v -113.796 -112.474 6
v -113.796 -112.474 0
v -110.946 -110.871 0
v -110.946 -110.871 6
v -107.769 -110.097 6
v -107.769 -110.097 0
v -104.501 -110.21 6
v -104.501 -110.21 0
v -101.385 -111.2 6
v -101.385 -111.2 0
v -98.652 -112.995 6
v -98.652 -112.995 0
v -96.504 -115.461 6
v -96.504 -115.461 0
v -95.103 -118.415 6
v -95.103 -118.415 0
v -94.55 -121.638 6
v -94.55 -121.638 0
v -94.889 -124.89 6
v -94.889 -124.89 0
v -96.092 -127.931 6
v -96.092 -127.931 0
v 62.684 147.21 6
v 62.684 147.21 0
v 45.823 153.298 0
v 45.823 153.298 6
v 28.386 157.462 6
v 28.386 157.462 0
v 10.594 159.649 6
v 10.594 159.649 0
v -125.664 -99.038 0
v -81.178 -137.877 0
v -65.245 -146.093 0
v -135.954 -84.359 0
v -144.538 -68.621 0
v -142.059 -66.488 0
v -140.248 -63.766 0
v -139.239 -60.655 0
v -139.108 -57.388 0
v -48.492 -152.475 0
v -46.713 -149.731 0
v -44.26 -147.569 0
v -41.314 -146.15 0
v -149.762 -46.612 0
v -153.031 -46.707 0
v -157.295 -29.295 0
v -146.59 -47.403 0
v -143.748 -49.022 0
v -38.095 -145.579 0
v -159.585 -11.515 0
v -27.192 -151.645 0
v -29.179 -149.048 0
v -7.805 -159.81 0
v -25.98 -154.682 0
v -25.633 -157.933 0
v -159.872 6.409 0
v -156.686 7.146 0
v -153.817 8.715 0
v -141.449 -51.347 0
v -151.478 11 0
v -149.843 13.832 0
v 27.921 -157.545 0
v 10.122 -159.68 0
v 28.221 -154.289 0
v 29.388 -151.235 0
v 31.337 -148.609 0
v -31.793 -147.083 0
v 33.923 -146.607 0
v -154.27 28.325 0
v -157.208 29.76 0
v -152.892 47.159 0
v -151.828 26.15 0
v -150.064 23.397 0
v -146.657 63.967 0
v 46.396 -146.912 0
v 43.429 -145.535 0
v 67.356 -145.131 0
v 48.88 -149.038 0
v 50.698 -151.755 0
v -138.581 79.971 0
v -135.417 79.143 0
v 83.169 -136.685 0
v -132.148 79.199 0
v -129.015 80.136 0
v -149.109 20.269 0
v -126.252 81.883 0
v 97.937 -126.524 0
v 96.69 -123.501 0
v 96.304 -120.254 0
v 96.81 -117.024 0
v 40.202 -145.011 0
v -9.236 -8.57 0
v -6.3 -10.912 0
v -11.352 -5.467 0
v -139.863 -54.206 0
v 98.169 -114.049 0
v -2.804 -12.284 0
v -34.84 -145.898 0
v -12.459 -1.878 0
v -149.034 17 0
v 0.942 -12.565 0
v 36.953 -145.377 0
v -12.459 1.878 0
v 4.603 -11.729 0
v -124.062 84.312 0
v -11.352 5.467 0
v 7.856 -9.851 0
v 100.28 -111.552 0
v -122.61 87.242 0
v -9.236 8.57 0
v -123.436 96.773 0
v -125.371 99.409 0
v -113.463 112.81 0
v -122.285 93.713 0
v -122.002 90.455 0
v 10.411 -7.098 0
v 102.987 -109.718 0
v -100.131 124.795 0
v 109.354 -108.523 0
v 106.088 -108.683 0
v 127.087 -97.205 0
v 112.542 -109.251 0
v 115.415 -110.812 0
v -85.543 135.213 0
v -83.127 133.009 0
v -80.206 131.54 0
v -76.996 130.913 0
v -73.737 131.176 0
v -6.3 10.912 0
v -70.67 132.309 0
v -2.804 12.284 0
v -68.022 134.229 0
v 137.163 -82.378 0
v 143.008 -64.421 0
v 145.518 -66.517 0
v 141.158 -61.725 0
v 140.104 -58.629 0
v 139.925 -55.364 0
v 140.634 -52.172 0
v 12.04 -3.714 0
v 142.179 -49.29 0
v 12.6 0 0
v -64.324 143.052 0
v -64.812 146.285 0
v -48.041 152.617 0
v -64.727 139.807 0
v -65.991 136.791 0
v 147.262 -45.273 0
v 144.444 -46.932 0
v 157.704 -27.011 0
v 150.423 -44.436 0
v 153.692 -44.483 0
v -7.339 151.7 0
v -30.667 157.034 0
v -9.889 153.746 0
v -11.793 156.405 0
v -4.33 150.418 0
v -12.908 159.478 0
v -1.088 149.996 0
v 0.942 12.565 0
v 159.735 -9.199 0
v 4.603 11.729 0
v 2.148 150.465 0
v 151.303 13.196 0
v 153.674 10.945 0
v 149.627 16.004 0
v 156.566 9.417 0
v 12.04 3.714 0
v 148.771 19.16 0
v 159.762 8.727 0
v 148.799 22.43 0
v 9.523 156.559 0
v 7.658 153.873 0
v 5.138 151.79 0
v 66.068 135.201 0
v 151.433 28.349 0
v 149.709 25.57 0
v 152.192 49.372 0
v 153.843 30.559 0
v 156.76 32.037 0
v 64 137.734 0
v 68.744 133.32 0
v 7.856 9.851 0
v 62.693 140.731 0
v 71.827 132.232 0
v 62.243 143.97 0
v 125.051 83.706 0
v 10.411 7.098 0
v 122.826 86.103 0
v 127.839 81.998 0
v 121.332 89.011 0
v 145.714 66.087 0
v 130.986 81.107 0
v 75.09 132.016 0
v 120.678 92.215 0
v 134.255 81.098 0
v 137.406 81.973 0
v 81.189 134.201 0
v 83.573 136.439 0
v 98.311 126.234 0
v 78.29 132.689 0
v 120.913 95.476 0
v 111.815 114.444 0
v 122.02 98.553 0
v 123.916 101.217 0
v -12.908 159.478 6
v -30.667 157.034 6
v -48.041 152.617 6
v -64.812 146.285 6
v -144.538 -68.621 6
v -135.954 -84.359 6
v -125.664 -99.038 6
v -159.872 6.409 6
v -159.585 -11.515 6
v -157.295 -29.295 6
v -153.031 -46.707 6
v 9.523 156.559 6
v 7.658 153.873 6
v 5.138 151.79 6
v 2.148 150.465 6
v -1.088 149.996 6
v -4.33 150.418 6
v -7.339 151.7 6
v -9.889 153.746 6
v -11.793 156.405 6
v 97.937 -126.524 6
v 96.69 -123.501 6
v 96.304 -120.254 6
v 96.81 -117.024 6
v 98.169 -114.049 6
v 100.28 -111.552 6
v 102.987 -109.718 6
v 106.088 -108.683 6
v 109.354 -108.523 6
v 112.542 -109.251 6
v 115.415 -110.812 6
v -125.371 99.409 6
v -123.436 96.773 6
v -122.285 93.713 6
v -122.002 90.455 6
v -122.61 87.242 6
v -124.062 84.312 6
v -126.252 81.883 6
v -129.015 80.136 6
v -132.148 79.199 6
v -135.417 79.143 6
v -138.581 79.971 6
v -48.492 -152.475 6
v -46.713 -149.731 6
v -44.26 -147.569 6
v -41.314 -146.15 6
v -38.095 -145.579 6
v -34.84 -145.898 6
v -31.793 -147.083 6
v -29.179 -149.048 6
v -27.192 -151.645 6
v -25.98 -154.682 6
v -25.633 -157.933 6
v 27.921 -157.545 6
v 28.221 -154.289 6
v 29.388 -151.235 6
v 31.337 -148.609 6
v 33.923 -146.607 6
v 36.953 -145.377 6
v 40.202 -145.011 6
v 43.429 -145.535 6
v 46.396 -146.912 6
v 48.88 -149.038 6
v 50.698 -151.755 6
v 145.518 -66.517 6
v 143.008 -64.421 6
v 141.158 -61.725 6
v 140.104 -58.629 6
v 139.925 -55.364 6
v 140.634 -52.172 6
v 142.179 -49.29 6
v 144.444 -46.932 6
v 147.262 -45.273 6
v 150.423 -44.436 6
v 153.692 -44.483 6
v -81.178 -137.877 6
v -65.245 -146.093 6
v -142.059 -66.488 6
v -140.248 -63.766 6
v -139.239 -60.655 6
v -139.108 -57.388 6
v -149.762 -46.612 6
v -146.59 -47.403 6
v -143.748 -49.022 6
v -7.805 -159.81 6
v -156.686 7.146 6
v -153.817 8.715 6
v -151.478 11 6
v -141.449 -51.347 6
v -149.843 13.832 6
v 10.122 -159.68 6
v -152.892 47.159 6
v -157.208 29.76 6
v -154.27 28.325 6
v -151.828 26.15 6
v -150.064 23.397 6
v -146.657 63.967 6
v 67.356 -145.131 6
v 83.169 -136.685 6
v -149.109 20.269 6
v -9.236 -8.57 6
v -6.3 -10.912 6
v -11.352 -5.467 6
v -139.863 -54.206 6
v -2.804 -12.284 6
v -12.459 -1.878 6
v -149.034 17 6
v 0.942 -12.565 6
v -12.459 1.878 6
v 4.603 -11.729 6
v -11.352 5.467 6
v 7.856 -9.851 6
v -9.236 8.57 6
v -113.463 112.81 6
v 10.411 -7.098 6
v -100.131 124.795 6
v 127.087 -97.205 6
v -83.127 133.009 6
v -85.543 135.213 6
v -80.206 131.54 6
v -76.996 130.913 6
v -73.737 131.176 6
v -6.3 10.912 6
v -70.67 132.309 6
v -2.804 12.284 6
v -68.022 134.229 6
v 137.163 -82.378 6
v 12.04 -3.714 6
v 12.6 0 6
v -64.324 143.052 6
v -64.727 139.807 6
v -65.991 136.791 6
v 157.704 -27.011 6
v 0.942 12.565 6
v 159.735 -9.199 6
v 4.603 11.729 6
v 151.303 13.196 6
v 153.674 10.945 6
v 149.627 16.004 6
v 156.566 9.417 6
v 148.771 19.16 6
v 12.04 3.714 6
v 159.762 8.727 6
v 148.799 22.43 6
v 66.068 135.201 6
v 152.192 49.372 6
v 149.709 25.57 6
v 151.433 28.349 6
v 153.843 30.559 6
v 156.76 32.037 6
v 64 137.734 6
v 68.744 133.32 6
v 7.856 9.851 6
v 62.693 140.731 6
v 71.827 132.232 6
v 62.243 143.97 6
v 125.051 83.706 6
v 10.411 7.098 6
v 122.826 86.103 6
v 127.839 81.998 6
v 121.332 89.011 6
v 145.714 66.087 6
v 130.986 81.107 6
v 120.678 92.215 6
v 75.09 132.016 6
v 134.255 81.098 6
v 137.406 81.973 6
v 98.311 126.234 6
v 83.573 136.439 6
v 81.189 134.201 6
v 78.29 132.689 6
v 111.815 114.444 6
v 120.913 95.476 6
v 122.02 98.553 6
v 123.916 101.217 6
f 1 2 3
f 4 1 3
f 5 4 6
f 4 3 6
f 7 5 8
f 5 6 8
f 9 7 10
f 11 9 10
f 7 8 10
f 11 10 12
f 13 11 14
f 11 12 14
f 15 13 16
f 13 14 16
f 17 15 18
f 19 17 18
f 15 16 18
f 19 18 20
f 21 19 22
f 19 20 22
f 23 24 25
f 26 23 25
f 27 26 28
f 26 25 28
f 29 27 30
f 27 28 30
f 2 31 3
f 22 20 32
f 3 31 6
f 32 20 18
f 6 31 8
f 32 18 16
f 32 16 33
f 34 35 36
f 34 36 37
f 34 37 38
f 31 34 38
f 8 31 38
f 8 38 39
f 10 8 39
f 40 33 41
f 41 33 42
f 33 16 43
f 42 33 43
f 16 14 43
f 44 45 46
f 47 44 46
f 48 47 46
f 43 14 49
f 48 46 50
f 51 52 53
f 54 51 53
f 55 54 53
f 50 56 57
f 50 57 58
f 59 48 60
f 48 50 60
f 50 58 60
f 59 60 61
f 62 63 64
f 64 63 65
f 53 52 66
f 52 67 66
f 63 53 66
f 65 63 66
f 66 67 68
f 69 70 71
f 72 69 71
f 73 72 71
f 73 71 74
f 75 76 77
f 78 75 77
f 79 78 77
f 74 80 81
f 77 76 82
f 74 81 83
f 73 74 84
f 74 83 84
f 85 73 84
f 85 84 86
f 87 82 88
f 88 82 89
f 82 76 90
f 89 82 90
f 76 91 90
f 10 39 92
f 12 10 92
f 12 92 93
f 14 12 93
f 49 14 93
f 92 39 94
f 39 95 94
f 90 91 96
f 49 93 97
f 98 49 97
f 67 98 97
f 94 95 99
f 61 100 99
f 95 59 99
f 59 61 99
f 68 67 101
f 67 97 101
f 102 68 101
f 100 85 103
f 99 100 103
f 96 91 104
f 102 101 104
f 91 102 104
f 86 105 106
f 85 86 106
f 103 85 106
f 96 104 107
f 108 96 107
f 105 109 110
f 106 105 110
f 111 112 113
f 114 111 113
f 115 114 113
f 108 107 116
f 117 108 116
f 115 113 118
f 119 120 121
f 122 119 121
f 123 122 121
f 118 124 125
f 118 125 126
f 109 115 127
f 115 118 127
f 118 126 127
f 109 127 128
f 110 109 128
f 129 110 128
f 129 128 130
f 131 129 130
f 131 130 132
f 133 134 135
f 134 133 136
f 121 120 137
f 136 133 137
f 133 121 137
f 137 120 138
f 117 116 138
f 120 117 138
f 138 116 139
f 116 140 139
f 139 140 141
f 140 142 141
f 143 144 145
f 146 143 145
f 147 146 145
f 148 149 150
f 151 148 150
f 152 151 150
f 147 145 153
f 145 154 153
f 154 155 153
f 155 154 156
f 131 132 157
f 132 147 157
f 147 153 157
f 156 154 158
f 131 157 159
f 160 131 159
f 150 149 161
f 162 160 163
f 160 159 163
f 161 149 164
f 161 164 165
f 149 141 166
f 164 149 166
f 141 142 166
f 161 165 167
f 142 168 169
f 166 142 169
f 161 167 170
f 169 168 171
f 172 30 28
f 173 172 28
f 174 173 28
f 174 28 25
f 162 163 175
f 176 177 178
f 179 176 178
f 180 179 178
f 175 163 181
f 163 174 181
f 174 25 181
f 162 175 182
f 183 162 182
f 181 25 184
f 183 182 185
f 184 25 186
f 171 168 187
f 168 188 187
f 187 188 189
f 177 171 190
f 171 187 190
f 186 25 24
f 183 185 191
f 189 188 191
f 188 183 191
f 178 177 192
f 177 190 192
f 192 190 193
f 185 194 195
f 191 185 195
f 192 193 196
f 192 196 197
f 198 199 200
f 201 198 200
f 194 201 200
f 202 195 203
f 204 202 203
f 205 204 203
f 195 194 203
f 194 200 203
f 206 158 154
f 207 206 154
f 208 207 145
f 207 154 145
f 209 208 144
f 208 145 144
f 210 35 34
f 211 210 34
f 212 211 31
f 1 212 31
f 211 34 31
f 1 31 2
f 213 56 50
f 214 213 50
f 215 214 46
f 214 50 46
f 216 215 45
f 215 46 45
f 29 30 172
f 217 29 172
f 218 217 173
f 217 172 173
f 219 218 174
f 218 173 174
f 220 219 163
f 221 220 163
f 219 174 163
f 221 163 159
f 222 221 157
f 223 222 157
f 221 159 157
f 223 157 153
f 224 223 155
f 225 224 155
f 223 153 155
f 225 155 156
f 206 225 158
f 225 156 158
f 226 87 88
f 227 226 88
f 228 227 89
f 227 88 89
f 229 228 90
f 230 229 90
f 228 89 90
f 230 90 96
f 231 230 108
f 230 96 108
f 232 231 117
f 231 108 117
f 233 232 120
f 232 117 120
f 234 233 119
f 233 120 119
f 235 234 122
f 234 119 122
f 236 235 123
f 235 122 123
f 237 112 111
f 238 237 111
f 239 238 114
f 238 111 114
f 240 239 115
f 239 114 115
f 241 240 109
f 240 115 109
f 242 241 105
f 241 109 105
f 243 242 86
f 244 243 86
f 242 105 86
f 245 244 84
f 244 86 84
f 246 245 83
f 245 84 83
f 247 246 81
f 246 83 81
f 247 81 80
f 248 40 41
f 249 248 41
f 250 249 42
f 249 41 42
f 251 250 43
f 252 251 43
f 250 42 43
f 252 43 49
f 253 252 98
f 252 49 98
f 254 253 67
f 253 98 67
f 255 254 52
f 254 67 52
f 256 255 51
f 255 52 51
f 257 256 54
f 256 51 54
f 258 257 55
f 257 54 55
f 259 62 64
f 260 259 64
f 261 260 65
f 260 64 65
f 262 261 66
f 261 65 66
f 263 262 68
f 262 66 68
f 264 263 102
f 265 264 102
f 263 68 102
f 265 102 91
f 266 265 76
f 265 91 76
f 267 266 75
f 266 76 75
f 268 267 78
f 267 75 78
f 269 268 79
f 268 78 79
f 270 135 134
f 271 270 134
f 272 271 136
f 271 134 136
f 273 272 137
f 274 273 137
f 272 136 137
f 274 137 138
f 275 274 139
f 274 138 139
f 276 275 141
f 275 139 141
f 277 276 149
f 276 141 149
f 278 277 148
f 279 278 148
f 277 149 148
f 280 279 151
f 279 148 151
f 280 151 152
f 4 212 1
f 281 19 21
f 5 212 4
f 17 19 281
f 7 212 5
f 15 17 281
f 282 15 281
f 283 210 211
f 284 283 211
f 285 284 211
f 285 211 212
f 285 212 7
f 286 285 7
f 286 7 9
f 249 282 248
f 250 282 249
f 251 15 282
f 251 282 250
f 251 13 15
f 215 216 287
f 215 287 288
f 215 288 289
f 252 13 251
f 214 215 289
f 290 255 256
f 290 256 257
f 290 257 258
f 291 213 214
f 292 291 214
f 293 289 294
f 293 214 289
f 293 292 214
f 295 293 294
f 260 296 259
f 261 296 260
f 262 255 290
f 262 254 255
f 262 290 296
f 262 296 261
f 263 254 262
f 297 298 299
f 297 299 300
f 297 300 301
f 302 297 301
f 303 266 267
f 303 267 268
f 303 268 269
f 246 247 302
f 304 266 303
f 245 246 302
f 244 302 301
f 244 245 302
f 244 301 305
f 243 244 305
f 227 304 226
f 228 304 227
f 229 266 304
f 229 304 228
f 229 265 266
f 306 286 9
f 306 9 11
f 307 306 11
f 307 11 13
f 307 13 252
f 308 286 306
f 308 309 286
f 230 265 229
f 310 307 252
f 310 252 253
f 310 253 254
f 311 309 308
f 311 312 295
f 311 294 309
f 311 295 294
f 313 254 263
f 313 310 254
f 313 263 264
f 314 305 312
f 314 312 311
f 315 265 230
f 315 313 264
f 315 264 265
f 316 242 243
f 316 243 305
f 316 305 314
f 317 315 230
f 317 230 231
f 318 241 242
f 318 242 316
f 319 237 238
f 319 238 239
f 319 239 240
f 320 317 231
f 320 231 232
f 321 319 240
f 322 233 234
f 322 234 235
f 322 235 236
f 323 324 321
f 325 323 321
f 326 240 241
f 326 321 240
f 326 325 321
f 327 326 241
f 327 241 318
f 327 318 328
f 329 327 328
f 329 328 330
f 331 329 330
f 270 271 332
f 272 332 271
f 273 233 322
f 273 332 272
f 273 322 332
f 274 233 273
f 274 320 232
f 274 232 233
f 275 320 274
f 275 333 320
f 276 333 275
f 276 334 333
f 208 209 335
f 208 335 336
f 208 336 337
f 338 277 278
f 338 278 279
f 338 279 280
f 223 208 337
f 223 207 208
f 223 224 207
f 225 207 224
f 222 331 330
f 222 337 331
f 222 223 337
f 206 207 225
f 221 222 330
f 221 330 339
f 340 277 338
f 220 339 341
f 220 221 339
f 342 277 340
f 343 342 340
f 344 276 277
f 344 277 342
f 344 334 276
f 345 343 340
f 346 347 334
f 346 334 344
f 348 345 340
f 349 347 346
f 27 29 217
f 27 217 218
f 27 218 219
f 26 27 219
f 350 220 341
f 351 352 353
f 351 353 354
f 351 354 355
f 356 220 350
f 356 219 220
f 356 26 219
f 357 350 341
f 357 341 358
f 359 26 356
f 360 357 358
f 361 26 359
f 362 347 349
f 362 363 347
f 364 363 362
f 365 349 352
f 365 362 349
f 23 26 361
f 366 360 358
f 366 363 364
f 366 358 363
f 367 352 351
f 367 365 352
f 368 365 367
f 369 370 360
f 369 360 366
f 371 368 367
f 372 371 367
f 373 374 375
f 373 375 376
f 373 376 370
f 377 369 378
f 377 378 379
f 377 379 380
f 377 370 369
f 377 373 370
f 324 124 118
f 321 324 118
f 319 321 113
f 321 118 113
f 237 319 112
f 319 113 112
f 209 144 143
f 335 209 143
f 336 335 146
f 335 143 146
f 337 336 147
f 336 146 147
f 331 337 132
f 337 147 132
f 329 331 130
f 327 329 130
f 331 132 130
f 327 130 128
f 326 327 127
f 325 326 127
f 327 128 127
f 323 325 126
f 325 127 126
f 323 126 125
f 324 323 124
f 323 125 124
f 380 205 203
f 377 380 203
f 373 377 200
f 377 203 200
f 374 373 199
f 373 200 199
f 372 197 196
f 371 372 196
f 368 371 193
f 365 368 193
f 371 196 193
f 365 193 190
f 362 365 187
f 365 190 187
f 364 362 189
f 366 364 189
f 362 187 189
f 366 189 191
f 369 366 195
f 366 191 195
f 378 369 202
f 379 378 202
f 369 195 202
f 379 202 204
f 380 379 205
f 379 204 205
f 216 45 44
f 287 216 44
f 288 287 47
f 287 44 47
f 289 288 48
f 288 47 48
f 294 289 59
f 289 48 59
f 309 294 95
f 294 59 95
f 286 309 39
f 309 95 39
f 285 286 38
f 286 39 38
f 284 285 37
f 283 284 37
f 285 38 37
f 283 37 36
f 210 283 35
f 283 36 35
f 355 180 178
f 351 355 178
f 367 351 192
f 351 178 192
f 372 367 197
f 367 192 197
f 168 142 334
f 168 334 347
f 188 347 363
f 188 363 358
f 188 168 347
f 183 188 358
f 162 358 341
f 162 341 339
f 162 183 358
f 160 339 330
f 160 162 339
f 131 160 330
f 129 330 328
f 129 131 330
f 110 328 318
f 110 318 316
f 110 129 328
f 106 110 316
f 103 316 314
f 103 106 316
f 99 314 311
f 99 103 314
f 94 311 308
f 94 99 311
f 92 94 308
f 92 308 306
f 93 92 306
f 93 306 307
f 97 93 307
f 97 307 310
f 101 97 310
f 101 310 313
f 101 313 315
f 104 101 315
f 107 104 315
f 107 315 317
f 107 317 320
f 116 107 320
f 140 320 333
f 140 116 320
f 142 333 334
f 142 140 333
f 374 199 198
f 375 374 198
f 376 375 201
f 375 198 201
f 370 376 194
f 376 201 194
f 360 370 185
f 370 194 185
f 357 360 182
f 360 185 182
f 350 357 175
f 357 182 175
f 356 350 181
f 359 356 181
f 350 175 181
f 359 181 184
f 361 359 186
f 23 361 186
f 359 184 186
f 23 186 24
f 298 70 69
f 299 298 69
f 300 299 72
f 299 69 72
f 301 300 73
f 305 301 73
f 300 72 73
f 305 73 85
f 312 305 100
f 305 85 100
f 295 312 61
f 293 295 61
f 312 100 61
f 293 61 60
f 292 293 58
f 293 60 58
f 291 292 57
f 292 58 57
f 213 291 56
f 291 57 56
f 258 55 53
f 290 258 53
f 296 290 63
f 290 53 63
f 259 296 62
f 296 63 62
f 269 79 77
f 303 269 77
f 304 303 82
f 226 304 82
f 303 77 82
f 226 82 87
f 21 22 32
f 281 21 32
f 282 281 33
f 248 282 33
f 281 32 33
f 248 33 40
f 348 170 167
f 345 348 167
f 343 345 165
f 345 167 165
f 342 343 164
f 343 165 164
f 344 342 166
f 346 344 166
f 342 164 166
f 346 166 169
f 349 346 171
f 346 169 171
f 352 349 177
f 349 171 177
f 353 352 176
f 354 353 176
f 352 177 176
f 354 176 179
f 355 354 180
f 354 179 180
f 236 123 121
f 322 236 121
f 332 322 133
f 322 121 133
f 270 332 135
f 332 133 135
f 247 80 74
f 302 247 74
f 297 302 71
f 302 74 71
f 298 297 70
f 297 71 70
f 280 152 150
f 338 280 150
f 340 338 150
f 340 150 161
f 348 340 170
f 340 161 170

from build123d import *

# Parameters (mm, degrees)
ESQUISSE1_R        = 12.6
BOSS_EXTRU_1_DEPTH = 6


with BuildPart() as part:
    # Esquisse1 → Boss.-Extru.1 (new body)
    with BuildSketch(Plane.XY):
        with BuildLine():
            ThreePointArc((-85.542599785, 135.212660731), (-106.965290191, 118.9891873), (-125.370670455, 99.409229902))
            ThreePointArc((-125.370670455, 99.409229902), (-124.062234057, 84.312289025), (-138.580667025, 79.971236872))
            ThreePointArc((-138.580667025, 79.971236872), (-150.010093296, 55.650443927), (-157.207988245, 29.759845967))
            ThreePointArc((-157.207988245, 29.759845967), (-149.0335271, 17.000229412), (-159.871573528, 6.409366404))
            ThreePointArc((-159.871573528, 6.409366404), (-158.689391845, -20.43714549), (-153.03085049, -46.707160034))
            ThreePointArc((-153.03085049, -46.707160034), (-139.863035133, -54.206377884), (-144.537829197, -68.620812667))
            ThreePointArc((-144.537829197, -68.620812667), (-131.014863137, -91.84283117), (-113.796189109, -112.474118553))
            ThreePointArc((-113.796189109, -112.474118553), (-98.651607349, -112.994957265), (-96.092210067, -127.930790526))
            ThreePointArc((-96.092210067, -127.930790526), (-73.326408184, -142.208431054), (-48.492192196, -152.474611972))
            ThreePointArc((-48.492192196, -152.474611972), (-34.840285202, -145.897753674), (-25.633023647, -157.933366008))
            ThreePointArc((-25.633023647, -157.933366008), (1.160243205, -159.995793181), (27.920781555, -157.545009306))
            ThreePointArc((27.920781555, -157.545009306), (36.952526413, -145.377132974), (50.698379579, -151.755310642))
            ThreePointArc((50.698379579, -151.755310642), (75.381096858, -141.130047249), (97.937440733, -126.523743632))
            ThreePointArc((97.937440733, -126.523743632), (100.279959554, -111.552363094), (115.415395025, -110.811942457))
            ThreePointArc((115.415395025, -110.811942457), (132.333049661, -89.933108294), (145.517812514, -66.517413067))
            ThreePointArc((145.517812514, -66.517413067), (140.634462465, -52.172291181), (153.692134377, -44.482893684))
            ThreePointArc((153.692134377, -44.482893684), (158.969095574, -18.13357804), (159.761807127, 8.727255209))
            ThreePointArc((159.761807127, 8.727255209), (148.771304855, 19.159823897), (156.759857935, 32.036649955))
            ThreePointArc((156.759857935, 32.036649955), (149.187237475, 57.82013641), (137.406297066, 81.972614492))
            ThreePointArc((137.406297066, 81.972614492), (122.826434191, 86.102654221), (123.9157872, 101.216983173))
            ThreePointArc((123.9157872, 101.216983173), (105.228381173, 120.527954416), (83.572660273, 136.439035672))
            ThreePointArc((83.572660273, 136.439035672), (68.743507673, 133.320404113), (62.684102965, 147.209725343))
            ThreePointArc((62.684102965, 147.209725343), (37.162970883, 155.624270585), (10.59353417, 159.648918048))
            ThreePointArc((10.59353417, 159.648918048), (-1.087728004, 149.996056107), (-12.907753834, 159.478493506))
            ThreePointArc((-12.907753834, 159.478493506), (-39.416028174, 155.068941839), (-64.812442944, 146.285157277))
            ThreePointArc((-64.812442944, 146.285157277), (-70.669778304, 132.309419296), (-85.542599785, 135.212660731))
        make_face()
        Circle(ESQUISSE1_R, mode=Mode.SUBTRACT)
    extrude(amount=BOSS_EXTRU_1_DEPTH)


solid = part.part
